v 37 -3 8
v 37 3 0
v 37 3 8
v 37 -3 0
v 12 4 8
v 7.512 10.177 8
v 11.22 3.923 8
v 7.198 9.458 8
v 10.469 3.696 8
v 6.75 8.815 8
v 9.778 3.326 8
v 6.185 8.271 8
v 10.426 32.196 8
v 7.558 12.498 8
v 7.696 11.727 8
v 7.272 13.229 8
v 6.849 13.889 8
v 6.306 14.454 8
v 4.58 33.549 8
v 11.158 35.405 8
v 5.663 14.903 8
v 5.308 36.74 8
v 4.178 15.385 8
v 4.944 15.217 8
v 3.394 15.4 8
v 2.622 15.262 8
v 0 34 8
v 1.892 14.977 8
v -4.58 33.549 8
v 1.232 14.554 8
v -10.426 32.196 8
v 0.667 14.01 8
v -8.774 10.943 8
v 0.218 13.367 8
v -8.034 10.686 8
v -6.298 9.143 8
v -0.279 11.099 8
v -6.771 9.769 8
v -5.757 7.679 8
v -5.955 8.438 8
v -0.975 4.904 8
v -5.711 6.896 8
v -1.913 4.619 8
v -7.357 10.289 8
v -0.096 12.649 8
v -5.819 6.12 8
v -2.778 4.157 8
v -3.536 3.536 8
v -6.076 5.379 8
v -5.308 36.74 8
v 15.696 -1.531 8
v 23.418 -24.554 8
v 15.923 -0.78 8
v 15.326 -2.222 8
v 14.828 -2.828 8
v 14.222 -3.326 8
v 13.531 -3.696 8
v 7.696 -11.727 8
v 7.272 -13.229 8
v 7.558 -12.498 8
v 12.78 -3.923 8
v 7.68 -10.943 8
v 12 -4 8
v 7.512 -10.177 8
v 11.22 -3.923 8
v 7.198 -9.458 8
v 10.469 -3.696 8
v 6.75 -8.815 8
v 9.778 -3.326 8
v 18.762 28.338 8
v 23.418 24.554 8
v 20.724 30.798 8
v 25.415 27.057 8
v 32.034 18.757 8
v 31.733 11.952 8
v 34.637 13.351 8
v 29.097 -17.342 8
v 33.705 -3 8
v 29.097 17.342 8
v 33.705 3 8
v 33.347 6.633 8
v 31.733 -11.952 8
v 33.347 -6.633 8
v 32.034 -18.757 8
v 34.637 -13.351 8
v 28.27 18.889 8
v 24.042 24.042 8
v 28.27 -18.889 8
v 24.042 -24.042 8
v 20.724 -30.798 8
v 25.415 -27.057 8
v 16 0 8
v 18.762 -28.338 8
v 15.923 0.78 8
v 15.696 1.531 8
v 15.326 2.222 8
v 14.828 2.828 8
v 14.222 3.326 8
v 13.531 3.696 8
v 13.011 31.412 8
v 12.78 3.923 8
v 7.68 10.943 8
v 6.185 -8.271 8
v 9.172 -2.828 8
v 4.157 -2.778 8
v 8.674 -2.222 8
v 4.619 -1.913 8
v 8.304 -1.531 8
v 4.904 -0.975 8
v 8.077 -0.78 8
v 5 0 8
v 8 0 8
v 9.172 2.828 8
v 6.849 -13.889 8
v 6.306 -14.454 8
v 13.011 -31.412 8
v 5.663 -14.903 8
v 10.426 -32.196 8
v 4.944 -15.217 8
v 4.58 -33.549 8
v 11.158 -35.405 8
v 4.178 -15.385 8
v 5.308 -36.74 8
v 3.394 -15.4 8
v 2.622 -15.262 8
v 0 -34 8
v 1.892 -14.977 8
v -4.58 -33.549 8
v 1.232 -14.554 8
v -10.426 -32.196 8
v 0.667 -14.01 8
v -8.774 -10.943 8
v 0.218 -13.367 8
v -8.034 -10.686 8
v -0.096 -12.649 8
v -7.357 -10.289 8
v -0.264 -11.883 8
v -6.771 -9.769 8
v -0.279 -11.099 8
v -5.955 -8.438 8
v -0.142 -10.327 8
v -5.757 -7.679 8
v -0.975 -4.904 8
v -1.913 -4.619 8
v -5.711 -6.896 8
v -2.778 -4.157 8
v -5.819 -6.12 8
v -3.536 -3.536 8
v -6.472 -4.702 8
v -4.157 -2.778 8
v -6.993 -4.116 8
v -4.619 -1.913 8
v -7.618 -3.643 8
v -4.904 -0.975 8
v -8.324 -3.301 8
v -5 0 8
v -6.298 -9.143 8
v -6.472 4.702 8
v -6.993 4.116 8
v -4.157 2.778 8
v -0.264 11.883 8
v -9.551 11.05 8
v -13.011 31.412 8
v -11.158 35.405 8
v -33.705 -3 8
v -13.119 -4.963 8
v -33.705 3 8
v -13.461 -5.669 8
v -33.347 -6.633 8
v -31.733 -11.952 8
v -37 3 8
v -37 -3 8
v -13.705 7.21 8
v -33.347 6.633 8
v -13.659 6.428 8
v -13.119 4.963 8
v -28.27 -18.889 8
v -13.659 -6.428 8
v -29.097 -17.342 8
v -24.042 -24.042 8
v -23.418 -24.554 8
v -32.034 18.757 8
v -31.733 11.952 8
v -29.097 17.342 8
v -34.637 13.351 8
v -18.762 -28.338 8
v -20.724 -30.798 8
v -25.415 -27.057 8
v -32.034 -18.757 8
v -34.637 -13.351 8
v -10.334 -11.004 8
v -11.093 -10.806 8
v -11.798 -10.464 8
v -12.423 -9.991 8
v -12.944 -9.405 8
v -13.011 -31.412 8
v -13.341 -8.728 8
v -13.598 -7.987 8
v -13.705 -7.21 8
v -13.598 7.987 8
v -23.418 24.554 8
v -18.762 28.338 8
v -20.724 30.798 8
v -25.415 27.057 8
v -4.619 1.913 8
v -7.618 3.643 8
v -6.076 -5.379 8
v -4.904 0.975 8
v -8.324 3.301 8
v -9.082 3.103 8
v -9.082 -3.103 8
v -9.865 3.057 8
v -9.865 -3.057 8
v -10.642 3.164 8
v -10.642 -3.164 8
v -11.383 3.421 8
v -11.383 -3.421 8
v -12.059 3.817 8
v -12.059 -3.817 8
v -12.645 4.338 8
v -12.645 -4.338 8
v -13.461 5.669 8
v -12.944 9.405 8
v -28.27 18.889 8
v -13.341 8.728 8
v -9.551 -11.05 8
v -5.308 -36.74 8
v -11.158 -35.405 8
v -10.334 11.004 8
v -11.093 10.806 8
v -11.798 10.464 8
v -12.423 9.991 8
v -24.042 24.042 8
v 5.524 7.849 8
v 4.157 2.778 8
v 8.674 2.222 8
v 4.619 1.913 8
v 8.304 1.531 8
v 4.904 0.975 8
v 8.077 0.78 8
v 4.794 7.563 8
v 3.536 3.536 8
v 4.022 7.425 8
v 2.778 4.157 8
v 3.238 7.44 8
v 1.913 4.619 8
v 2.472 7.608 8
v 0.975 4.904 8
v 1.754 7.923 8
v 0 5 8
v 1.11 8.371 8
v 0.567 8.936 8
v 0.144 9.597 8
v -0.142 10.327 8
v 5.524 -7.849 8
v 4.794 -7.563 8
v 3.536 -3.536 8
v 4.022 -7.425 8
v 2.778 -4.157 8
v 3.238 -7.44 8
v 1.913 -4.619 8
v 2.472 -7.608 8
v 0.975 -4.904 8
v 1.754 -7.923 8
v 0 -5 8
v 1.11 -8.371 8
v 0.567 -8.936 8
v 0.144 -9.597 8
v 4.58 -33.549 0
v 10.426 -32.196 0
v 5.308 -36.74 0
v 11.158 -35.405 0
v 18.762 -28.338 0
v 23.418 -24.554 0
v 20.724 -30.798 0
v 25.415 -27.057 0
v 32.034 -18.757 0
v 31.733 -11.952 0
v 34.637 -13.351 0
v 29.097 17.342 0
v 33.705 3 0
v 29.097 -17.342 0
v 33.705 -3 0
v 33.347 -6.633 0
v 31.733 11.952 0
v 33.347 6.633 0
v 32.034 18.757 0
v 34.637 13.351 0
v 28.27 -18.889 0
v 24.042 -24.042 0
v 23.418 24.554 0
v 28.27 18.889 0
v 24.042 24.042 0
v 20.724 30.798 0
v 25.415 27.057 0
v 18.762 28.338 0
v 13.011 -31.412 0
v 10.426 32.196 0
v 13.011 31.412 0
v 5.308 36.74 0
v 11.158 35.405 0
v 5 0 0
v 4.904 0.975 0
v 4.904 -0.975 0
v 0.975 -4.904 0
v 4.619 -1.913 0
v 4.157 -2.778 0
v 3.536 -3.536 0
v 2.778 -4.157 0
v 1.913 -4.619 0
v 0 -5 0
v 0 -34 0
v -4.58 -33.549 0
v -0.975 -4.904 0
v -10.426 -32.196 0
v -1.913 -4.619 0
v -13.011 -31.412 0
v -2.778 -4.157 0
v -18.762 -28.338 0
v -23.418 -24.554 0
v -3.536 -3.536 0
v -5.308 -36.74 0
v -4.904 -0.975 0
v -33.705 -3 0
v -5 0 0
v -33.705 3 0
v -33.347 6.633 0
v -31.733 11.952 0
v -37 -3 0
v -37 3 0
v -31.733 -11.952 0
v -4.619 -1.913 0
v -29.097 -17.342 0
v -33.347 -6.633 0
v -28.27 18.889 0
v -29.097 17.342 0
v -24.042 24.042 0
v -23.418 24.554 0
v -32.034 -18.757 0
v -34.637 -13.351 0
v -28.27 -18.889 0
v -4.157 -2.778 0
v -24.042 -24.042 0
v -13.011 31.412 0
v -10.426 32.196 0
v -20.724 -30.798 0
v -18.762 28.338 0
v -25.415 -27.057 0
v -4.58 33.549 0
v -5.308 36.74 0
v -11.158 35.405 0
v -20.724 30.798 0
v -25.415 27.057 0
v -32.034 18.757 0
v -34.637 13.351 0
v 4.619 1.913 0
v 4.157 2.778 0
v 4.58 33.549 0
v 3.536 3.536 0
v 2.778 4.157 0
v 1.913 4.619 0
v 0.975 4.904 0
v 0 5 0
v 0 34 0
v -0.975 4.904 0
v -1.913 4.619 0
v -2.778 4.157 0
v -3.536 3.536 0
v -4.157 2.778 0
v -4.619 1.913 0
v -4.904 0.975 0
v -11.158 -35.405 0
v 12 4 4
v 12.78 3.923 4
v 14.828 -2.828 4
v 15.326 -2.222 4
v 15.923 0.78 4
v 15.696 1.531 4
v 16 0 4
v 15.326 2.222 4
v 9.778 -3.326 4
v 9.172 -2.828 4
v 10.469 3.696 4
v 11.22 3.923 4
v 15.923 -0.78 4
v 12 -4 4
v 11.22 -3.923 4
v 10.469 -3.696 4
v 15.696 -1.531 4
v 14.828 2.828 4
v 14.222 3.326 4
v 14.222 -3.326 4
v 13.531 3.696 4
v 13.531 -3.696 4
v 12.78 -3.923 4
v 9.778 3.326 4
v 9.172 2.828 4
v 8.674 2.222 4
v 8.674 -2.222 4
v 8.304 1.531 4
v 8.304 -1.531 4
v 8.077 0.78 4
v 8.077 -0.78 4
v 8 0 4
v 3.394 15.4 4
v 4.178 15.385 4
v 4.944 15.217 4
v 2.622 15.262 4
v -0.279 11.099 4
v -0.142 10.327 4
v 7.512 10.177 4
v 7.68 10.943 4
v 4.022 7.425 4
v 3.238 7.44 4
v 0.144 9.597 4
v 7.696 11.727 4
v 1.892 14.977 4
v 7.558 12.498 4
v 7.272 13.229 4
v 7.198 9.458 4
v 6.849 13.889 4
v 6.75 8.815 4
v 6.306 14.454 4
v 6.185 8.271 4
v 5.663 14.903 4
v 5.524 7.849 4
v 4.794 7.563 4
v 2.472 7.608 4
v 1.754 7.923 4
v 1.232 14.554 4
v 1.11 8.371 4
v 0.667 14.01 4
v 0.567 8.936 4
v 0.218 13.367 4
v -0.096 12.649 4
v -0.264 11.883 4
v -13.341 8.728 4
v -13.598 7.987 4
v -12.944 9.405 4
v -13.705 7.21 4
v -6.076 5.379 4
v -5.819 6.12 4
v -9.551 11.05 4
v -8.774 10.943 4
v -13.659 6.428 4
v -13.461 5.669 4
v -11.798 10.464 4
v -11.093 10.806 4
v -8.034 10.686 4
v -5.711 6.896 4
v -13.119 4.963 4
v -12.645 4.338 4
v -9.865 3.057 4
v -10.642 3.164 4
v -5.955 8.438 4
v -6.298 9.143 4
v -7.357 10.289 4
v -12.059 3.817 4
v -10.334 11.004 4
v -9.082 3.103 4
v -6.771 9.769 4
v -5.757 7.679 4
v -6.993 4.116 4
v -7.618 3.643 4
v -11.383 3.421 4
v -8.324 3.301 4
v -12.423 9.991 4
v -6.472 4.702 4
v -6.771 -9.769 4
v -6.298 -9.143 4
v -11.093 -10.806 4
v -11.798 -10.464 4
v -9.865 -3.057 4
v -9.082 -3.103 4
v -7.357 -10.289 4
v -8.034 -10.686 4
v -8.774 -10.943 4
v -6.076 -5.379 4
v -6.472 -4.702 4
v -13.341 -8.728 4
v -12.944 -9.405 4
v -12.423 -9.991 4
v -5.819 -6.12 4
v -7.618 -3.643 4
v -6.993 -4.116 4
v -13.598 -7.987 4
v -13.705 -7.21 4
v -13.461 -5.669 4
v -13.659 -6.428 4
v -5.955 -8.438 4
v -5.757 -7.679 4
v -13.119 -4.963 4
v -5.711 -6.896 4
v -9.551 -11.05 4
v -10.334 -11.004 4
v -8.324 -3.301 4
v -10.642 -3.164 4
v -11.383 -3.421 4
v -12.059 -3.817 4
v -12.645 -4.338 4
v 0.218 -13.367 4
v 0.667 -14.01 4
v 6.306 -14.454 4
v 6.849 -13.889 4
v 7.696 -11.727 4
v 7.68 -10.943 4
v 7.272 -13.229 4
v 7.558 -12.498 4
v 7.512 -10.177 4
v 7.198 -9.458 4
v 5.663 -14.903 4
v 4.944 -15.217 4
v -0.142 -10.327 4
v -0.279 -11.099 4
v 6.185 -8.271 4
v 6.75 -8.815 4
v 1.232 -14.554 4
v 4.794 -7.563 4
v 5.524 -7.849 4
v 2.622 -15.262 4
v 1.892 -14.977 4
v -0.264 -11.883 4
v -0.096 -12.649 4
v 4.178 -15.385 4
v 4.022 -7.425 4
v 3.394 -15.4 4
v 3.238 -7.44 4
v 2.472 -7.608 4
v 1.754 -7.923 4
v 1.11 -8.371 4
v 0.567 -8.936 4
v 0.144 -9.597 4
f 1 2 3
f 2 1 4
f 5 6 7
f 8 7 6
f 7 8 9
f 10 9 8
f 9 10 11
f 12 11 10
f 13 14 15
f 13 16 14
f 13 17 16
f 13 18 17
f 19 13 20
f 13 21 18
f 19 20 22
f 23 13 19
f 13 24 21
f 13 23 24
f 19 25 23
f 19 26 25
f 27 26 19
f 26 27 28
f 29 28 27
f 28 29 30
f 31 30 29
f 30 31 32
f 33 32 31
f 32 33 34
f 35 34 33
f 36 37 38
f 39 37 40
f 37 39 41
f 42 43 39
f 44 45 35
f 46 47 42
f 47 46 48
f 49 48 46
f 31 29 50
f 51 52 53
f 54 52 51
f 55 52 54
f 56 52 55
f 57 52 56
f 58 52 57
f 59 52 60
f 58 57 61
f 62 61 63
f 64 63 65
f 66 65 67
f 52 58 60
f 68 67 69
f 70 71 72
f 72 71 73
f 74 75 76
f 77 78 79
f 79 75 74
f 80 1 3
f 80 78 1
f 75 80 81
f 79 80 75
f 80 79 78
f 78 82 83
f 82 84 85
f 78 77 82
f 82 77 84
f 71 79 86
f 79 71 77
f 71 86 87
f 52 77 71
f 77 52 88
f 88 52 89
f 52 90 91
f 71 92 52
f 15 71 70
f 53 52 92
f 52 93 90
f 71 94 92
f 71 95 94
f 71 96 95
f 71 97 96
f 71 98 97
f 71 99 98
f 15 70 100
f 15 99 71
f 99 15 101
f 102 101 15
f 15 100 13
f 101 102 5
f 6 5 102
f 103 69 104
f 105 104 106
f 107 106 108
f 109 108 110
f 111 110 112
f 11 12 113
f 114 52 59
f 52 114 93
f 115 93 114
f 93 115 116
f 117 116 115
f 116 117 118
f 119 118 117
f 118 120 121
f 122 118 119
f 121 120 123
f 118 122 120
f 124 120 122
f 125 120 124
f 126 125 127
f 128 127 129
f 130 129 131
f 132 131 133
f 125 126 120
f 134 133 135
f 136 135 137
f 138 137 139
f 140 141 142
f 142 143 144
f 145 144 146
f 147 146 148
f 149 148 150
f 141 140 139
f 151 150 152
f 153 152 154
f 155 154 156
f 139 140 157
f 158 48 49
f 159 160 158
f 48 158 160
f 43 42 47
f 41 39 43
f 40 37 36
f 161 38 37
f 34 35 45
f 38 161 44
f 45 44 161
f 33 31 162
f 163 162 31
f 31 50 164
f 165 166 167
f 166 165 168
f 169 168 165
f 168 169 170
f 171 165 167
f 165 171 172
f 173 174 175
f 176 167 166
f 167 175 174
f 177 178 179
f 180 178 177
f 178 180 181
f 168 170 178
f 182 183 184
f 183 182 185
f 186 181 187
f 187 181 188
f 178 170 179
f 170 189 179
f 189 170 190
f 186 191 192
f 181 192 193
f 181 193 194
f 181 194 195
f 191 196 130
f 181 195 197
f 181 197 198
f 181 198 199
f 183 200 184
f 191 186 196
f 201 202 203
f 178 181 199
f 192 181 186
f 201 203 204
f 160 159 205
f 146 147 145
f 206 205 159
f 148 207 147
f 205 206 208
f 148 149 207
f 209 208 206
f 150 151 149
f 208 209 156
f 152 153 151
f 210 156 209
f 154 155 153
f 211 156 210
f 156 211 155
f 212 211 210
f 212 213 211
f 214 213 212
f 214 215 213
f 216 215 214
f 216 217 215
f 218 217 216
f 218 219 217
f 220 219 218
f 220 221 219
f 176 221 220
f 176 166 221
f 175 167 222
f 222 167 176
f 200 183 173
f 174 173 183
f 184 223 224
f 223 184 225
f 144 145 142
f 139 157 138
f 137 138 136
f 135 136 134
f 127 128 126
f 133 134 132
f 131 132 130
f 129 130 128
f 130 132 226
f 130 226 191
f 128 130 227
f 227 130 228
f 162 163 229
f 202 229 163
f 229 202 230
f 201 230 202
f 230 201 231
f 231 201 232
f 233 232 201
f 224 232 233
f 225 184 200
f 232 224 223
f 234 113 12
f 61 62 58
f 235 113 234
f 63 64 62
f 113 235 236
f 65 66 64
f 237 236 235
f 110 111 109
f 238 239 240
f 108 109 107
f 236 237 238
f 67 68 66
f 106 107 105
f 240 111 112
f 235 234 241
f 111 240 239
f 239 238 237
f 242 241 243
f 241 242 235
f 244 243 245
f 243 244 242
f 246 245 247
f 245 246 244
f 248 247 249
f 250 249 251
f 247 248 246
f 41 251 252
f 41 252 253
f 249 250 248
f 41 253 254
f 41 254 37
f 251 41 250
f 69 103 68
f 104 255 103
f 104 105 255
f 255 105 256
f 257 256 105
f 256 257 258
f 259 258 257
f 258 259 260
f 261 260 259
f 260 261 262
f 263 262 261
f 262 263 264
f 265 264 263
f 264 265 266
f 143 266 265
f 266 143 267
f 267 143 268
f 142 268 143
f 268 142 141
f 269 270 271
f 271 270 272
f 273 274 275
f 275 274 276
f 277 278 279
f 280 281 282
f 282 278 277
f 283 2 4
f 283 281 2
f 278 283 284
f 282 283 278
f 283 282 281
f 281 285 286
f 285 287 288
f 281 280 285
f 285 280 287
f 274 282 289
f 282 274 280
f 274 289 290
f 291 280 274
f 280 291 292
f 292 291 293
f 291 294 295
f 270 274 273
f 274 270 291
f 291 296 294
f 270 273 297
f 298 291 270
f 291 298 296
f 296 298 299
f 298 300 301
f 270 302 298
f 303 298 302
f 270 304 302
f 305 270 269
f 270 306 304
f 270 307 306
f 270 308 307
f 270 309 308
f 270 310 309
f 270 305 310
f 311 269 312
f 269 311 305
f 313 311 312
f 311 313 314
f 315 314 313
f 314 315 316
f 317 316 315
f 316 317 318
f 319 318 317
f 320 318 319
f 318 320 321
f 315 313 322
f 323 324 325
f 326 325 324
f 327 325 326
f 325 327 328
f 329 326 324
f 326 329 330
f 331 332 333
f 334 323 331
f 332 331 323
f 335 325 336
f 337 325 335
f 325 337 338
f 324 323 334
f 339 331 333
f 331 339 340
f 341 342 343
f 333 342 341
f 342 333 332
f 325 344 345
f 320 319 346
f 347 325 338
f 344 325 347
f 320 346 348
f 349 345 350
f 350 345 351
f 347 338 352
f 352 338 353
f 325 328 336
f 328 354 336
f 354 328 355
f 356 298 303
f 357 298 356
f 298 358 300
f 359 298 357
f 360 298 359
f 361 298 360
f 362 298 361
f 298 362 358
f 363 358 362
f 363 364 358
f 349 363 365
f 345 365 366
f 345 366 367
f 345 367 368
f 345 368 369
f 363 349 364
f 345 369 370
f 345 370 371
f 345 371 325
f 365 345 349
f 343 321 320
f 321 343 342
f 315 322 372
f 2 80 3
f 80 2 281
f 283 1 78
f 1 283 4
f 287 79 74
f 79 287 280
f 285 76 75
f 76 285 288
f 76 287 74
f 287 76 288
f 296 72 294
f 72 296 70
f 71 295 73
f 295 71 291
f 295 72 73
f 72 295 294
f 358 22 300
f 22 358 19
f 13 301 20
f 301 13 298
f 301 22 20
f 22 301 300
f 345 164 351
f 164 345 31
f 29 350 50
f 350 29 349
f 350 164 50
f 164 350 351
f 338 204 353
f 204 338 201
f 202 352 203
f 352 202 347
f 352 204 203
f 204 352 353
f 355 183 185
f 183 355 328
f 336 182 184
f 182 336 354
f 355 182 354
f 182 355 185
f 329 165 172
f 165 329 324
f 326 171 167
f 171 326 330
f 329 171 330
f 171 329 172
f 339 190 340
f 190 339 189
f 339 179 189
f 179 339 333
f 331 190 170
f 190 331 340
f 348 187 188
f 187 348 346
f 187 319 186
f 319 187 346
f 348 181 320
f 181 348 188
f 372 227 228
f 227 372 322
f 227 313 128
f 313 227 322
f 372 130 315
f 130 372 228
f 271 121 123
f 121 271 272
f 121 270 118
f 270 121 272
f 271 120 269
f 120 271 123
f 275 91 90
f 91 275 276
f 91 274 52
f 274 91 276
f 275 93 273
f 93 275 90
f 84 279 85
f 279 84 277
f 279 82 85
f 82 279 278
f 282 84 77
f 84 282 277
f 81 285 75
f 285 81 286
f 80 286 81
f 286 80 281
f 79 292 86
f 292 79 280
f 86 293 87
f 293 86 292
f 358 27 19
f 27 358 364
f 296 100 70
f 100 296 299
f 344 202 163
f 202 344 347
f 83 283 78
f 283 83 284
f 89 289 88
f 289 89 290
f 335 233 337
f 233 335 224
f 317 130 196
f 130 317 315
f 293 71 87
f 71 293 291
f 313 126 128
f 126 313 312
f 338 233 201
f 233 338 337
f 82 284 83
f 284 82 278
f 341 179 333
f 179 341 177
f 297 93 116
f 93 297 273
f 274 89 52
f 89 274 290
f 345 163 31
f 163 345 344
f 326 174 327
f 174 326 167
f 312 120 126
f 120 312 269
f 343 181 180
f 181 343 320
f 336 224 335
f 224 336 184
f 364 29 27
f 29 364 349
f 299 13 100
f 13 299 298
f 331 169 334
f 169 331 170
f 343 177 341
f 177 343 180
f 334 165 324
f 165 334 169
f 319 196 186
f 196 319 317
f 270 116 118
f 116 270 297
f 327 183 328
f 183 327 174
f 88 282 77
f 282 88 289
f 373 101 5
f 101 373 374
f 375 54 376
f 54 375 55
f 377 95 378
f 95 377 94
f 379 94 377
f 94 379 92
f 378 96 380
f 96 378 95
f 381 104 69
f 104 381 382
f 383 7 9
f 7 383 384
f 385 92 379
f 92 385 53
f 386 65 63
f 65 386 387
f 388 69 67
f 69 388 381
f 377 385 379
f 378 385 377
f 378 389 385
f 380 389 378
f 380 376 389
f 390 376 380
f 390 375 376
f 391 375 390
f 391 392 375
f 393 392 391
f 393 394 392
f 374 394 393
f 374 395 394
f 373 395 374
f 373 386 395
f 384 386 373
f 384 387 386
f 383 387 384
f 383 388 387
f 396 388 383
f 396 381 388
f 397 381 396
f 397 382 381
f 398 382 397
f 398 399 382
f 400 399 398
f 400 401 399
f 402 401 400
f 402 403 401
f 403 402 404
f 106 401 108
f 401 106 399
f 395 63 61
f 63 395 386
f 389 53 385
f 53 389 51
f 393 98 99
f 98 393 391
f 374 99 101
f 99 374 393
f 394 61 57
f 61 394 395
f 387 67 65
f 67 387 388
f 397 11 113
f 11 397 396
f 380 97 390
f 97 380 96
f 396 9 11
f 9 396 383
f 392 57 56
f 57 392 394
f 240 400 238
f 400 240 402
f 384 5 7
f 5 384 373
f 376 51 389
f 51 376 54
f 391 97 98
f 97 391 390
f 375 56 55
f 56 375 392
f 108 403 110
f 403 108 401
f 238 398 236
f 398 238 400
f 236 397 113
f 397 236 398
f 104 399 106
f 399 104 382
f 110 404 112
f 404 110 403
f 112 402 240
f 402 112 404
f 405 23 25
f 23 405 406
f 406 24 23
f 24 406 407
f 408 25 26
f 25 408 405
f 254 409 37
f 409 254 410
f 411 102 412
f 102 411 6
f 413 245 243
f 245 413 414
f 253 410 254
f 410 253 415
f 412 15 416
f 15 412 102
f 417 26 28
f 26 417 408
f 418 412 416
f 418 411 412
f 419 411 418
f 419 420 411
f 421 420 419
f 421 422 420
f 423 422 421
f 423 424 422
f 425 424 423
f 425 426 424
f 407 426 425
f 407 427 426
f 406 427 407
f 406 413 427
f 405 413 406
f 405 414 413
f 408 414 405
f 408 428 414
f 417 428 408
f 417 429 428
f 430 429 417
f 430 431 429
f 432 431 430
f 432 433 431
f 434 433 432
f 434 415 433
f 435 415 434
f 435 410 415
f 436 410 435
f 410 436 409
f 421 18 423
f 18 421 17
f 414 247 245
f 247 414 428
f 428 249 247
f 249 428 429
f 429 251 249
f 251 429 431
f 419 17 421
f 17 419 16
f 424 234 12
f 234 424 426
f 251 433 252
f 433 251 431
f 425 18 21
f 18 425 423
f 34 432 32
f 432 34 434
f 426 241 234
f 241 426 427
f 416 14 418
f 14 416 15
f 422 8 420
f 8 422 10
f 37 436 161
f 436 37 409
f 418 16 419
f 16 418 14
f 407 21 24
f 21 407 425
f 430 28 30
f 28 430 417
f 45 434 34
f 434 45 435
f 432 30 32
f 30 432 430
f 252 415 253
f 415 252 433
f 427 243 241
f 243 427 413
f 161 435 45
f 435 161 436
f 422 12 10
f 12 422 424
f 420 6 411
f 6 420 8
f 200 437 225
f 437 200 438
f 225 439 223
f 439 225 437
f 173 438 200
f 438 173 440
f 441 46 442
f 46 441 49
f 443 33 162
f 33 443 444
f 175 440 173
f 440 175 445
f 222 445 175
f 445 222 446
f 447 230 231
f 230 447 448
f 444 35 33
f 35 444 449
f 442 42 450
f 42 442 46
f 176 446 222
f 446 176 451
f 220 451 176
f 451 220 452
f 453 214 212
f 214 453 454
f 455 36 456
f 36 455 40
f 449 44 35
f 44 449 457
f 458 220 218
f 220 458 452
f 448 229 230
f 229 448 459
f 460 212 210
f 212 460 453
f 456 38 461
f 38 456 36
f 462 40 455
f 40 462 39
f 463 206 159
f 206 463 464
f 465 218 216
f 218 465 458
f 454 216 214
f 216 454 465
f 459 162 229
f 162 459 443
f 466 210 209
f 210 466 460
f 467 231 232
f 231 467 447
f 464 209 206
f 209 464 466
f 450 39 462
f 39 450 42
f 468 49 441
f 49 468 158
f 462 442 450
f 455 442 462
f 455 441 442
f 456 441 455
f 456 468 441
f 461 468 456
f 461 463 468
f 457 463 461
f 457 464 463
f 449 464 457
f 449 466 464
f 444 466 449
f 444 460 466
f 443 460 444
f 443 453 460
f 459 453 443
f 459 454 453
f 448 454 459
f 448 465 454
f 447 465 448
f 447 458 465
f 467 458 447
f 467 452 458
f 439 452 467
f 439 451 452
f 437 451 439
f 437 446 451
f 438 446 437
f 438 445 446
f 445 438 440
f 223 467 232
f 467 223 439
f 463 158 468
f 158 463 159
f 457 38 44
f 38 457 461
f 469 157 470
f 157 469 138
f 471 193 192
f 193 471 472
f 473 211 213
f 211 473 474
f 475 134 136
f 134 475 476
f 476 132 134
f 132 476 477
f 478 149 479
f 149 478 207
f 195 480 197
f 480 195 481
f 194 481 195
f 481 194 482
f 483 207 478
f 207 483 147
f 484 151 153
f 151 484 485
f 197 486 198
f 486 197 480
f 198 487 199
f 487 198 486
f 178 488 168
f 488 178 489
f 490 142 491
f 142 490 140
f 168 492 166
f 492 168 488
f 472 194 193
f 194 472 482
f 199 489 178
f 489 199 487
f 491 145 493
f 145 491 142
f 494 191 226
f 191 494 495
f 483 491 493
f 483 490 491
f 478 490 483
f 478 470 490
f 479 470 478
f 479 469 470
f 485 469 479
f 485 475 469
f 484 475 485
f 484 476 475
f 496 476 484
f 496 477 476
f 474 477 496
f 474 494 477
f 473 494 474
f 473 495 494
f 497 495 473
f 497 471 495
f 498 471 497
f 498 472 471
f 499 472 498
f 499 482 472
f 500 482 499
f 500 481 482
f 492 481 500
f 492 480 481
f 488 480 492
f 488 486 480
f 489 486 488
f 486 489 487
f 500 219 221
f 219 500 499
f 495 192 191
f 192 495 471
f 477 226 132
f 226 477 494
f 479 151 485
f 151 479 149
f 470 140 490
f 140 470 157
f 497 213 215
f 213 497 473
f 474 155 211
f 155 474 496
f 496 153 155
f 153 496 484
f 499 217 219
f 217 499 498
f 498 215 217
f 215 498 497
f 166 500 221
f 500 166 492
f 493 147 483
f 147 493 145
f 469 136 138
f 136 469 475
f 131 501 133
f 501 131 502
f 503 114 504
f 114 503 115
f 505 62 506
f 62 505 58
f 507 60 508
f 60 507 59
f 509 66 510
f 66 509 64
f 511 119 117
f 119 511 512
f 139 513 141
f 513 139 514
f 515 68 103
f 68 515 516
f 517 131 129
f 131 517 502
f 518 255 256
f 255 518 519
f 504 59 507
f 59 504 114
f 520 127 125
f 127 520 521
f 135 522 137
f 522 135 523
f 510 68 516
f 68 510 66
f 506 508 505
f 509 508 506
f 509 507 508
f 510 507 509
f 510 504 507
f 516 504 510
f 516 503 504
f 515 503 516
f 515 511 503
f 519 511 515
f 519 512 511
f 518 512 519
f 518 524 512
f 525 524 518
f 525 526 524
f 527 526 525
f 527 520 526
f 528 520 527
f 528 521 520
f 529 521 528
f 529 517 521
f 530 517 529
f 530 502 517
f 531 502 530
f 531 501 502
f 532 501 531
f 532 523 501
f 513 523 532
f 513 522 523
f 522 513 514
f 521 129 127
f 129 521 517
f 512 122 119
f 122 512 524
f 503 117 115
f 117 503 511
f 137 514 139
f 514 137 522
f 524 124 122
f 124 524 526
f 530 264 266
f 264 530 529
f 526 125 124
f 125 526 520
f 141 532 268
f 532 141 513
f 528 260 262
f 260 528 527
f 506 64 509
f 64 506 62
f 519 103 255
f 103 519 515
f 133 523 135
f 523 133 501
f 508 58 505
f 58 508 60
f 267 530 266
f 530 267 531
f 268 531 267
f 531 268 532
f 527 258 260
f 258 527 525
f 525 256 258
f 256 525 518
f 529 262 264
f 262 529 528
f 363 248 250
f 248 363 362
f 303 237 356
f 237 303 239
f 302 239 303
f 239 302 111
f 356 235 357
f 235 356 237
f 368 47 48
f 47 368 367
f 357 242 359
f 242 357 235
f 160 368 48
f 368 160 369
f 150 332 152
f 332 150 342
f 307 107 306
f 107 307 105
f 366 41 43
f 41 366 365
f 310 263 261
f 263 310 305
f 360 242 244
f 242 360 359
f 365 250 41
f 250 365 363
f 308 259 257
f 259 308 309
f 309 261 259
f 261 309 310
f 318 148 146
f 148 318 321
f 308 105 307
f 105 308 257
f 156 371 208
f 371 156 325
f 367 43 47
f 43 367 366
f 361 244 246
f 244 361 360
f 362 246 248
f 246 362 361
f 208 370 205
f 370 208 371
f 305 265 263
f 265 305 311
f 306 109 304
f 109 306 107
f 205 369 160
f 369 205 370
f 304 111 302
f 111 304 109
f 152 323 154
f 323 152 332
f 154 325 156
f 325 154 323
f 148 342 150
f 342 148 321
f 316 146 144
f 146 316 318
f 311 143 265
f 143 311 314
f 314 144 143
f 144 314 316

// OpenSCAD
$fn = 32;

// ----------------------------------------------------------------------
// Spur blank: lightened gear blank
// ----------------------------------------------------------------------

// --- parameters (mm) ---
disc_r = 34;              // blank root radius
disc_t = 8;               // blank thickness
n_teeth = 14;             // stub tooth count
tooth_w = 6;              // tooth width at the root
tooth_h = 3;              // tooth height above the root
bore_r = 5;               // central bore radius
ring_r = 12;              // lightening pocket ring radius
pocket_r = 4;             // lightening pocket radius

out_r = disc_r + tooth_h;  // tip radius
bbox_x = 74.0;  // measured width over the teeth
bbox_y = 73.48;  // measured depth over the teeth

difference() {
union() {
  cylinder(r = disc_r, h = disc_t);
  for (i = [0 : n_teeth - 1])
    rotate([0, 0, i * 360 / n_teeth])
      translate([disc_r - 1, -tooth_w / 2, 0])
        cube([tooth_h + 1, tooth_w, disc_t]);
}
  translate([0, 0, -1]) cylinder(r = bore_r, h = disc_t + 2);
  for (i = [0 : 5])
    rotate([0, 0, i * 72])
      translate([ring_r, 0, disc_t - 4])
        cylinder(r = pocket_r, h = 5);
}
